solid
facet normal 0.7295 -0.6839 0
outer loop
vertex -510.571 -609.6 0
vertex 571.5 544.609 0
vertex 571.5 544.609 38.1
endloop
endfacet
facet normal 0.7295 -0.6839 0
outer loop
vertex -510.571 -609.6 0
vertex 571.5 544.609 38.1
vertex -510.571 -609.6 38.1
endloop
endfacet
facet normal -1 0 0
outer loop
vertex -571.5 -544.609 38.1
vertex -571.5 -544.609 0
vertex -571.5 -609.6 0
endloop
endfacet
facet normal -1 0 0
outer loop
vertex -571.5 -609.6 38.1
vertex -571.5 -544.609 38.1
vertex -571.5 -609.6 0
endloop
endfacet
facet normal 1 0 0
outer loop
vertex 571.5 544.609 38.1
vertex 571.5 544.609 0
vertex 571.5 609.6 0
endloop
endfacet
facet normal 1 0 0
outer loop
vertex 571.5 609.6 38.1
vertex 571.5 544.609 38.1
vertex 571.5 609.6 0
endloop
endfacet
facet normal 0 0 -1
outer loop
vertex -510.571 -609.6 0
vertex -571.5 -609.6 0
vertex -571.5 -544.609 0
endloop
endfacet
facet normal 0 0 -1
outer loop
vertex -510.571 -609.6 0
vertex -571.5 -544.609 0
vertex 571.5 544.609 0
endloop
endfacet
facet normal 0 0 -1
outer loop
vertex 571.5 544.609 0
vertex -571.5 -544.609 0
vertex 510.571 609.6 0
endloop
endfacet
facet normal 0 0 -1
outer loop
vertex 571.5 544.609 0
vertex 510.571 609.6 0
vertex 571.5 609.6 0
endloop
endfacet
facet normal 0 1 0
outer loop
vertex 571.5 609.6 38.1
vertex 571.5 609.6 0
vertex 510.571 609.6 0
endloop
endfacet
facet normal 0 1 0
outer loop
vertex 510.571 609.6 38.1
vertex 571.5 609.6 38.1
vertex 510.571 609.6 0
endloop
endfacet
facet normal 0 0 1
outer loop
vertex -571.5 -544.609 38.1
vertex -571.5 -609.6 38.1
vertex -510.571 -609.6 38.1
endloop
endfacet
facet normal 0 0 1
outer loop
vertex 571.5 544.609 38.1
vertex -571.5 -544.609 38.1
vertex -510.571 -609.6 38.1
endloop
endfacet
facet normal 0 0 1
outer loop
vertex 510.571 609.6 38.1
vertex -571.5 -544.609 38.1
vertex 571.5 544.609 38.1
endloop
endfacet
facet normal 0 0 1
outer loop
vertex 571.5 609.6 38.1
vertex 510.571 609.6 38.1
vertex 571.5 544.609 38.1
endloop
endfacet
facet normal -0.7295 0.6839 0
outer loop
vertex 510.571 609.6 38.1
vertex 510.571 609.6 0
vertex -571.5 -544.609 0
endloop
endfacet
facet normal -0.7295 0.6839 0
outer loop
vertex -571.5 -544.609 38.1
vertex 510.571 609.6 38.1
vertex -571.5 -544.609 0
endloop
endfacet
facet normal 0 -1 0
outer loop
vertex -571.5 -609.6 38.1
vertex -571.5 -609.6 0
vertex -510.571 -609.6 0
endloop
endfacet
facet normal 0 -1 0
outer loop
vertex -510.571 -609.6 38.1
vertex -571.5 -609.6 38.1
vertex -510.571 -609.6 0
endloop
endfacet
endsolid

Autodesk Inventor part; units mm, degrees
ref_plane "YZ Plane" through (0, 0, 0) normal (1, 0, 0) x (0, 1, 0)
ref_plane "XZ Plane" through (0, 0, 0) normal (0, 1, 0) x (-1, 0, 0)
ref_plane "XY Plane" through (0, 0, 0) normal (0, 0, 1) x (1, 0, 0)
sketch "Sketch1" plane through (0, 0, 0) normal (0, 0, 1) x (1, 0, 0)
  line L0 (-571.5, -609.6) -> (571.5, -609.6)
  line L1 (571.5, -609.6) -> (571.5, 609.6)
  line L2 (571.5, 609.6) -> (-571.5, 609.6)
  line L3 (-571.5, 609.6) -> (-571.5, -609.6)
  line L4 (-571.5, -609.6) -> (571.5, 609.6) construction
  line L5 (571.5, -609.6) -> (-571.5, 609.6) construction
  line L6 (571.5, 609.6) -> (-571.5, -609.6)
  line L7 (-539.0721, -640.0012) -> (-603.9279, -579.1988)
  line L8 (603.9279, 579.1988) -> (539.0721, 640.0012)
  line L9 (539.0721, 640.0012) -> (-603.9279, -579.1988)
  line L10 (603.9279, 579.1988) -> (-539.0721, -640.0012)
  point P0 (0, 0)
  point P1 (510.571, 609.6)
  point P2 (-571.5, -544.609)
  point P3 (-510.571, -609.6)
  point P4 (571.5, 544.609)
  dimension "d0" = 1143
  dimension "d1" = 1219.2
  dimension "d2" = 88.9
  dimension "d3" = 88.9
extrude "Extrusion1" add sketch "Sketch1" along normal blind 38.1 contours L6 L1 L10 L0 | L3 L9 L2 L6
properties part number "S_2x4x65.795"
